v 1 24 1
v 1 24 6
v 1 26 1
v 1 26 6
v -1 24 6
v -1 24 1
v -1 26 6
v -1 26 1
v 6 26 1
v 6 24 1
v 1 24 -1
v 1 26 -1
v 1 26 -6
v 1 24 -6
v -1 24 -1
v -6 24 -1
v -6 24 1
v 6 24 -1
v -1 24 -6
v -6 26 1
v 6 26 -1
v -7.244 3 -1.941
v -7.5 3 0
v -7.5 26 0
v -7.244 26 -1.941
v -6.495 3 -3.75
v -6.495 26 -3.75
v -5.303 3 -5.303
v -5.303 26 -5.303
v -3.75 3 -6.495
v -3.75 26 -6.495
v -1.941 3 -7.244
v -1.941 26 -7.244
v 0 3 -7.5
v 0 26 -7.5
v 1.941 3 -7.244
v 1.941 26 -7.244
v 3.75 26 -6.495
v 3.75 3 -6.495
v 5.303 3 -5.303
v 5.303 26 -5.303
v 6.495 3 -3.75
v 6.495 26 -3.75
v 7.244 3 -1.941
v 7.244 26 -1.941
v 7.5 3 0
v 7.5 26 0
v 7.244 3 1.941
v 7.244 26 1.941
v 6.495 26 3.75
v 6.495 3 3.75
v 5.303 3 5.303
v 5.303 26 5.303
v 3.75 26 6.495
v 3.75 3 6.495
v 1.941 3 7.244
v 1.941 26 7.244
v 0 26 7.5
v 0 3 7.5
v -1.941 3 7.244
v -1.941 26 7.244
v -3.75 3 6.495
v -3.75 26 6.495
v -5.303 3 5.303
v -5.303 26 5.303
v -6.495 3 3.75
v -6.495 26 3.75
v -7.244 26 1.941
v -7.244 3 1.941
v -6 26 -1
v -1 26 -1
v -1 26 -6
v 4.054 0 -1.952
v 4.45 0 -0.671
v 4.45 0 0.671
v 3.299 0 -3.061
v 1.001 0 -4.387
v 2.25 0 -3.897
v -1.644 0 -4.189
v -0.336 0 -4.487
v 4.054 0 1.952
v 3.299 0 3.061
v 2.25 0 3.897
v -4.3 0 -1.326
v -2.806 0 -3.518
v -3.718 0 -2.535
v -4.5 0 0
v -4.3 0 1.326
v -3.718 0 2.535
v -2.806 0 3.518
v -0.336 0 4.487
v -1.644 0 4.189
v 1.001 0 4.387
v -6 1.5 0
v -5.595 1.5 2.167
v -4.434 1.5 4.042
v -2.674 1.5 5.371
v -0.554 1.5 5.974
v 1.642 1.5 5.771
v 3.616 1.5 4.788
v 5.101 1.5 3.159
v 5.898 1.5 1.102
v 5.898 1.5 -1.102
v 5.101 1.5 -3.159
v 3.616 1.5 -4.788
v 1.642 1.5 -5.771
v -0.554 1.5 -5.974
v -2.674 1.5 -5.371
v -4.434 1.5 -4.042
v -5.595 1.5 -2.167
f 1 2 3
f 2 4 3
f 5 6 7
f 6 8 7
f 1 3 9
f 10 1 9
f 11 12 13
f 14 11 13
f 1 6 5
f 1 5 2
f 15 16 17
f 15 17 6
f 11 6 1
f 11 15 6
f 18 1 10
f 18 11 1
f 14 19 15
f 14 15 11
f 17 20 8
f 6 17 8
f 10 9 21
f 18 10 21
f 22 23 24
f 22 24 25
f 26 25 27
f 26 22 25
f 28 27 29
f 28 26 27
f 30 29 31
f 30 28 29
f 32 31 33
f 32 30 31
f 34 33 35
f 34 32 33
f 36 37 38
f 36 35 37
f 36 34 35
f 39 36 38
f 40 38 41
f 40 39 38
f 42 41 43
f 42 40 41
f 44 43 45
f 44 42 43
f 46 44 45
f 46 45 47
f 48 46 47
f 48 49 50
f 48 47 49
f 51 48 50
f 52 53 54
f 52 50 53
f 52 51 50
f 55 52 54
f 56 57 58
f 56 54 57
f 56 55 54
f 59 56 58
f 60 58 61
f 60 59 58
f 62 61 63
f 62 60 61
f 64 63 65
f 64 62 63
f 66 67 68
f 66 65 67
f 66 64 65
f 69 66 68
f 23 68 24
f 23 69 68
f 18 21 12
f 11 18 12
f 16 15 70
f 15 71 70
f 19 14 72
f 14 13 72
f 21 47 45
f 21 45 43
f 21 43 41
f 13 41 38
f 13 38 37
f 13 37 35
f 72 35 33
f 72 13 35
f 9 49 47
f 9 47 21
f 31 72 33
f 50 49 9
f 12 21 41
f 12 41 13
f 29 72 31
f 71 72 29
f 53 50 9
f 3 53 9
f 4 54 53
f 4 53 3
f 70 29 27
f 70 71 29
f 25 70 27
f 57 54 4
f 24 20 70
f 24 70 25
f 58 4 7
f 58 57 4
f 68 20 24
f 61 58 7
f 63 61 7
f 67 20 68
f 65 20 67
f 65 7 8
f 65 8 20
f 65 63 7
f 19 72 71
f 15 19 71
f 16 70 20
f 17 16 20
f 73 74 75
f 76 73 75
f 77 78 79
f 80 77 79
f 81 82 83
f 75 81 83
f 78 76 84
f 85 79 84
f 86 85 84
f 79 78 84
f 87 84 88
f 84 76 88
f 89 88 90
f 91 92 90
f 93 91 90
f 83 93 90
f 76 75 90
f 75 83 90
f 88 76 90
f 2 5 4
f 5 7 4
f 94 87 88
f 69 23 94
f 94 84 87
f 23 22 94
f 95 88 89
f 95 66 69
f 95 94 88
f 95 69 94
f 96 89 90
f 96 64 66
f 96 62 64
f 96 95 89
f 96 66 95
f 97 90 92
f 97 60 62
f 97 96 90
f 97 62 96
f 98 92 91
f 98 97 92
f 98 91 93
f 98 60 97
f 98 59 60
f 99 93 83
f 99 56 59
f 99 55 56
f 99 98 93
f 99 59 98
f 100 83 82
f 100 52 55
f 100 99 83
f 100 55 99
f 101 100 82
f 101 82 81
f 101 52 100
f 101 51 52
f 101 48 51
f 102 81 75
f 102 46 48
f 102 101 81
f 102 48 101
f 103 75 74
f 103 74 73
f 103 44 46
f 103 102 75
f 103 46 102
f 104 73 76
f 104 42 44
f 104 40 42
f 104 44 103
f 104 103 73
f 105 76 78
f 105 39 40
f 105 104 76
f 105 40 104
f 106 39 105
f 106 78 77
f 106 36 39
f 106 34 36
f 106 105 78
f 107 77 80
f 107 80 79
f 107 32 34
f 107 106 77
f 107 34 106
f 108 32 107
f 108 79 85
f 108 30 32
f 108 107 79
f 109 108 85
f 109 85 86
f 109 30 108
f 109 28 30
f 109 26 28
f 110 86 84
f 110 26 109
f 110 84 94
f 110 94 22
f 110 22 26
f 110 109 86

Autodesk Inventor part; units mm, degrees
ref_plane "YZ Plane" through (0, 0, 0) normal (1, 0, 0) x (0, 1, 0)
ref_plane "XZ Plane" through (0, 0, 0) normal (0, 1, 0) x (-1, 0, 0)
ref_plane "XY Plane" through (0, 0, 0) normal (0, 0, 1) x (1, 0, 0)
sketch "Esquisse1" plane through (0, 0, 0) normal (0, 1, 0) x (-1, 0, 0)
  circle A0 centre (0, 0) radius 7.5
  dimension "d0" = 15
extrude "Extrusion1" add sketch "Esquisse1" along normal blind 26
chamfer "Chanfrein1" distance 3 angle 45 1 edges at (7.5, 0, 0)
sketch "Esquisse2" plane through (0, 26, 0) normal (0, 1, 0) x (1, 0, 0)
  line L0 (6, -1) -> (6, 1)
  line L1 (-6, 1) -> (-6, -1)
  line L2 (-1, -6) -> (1, -6)
  line L3 (1, 6) -> (-1, 6)
  circle A0 centre (0, 0) radius 7.5 projected
  line L4 (-1, 6) -> (-1, 1)
  line L5 (-1, -1) -> (-1, -6)
  line L6 (1, -6) -> (1, -1)
  line L7 (1, 1) -> (1, 6)
  line L8 (6, 1) -> (1, 1)
  line L9 (-1, 1) -> (-6, 1)
  line L10 (-6, -1) -> (-1, -1)
  line L11 (1, -1) -> (6, -1)
  circle A1 centre (0, 0) radius 4.5 projected
  dimension "d6" = 6
  dimension "d7" = 6
  dimension "d8" = 6
  dimension "d9" = 6
  dimension "d16" = 1
  dimension "d17" = 1
  dimension "d18" = 1
  dimension "d19" = 1
  dimension "d20" = 1
  dimension "d21" = 1
  dimension "d22" = 1
  dimension "d23" = 1
extrude "Extrusion2" cut sketch "Esquisse2" against normal blind 2 contours L11 A1 L8 L0 | L11 L6 A1 L5 L10 L9 L4 L7 L8 | L6 L2 L5 A1 | A1 L4 L3 L7 | L10 L1 L9 A1
sketch "Esquisse3" plane through (0, 24, 0) normal (0, 1, 0) x (1, 0, 0)
  point P0 (0, 0)
properties part number "Pion croix"
